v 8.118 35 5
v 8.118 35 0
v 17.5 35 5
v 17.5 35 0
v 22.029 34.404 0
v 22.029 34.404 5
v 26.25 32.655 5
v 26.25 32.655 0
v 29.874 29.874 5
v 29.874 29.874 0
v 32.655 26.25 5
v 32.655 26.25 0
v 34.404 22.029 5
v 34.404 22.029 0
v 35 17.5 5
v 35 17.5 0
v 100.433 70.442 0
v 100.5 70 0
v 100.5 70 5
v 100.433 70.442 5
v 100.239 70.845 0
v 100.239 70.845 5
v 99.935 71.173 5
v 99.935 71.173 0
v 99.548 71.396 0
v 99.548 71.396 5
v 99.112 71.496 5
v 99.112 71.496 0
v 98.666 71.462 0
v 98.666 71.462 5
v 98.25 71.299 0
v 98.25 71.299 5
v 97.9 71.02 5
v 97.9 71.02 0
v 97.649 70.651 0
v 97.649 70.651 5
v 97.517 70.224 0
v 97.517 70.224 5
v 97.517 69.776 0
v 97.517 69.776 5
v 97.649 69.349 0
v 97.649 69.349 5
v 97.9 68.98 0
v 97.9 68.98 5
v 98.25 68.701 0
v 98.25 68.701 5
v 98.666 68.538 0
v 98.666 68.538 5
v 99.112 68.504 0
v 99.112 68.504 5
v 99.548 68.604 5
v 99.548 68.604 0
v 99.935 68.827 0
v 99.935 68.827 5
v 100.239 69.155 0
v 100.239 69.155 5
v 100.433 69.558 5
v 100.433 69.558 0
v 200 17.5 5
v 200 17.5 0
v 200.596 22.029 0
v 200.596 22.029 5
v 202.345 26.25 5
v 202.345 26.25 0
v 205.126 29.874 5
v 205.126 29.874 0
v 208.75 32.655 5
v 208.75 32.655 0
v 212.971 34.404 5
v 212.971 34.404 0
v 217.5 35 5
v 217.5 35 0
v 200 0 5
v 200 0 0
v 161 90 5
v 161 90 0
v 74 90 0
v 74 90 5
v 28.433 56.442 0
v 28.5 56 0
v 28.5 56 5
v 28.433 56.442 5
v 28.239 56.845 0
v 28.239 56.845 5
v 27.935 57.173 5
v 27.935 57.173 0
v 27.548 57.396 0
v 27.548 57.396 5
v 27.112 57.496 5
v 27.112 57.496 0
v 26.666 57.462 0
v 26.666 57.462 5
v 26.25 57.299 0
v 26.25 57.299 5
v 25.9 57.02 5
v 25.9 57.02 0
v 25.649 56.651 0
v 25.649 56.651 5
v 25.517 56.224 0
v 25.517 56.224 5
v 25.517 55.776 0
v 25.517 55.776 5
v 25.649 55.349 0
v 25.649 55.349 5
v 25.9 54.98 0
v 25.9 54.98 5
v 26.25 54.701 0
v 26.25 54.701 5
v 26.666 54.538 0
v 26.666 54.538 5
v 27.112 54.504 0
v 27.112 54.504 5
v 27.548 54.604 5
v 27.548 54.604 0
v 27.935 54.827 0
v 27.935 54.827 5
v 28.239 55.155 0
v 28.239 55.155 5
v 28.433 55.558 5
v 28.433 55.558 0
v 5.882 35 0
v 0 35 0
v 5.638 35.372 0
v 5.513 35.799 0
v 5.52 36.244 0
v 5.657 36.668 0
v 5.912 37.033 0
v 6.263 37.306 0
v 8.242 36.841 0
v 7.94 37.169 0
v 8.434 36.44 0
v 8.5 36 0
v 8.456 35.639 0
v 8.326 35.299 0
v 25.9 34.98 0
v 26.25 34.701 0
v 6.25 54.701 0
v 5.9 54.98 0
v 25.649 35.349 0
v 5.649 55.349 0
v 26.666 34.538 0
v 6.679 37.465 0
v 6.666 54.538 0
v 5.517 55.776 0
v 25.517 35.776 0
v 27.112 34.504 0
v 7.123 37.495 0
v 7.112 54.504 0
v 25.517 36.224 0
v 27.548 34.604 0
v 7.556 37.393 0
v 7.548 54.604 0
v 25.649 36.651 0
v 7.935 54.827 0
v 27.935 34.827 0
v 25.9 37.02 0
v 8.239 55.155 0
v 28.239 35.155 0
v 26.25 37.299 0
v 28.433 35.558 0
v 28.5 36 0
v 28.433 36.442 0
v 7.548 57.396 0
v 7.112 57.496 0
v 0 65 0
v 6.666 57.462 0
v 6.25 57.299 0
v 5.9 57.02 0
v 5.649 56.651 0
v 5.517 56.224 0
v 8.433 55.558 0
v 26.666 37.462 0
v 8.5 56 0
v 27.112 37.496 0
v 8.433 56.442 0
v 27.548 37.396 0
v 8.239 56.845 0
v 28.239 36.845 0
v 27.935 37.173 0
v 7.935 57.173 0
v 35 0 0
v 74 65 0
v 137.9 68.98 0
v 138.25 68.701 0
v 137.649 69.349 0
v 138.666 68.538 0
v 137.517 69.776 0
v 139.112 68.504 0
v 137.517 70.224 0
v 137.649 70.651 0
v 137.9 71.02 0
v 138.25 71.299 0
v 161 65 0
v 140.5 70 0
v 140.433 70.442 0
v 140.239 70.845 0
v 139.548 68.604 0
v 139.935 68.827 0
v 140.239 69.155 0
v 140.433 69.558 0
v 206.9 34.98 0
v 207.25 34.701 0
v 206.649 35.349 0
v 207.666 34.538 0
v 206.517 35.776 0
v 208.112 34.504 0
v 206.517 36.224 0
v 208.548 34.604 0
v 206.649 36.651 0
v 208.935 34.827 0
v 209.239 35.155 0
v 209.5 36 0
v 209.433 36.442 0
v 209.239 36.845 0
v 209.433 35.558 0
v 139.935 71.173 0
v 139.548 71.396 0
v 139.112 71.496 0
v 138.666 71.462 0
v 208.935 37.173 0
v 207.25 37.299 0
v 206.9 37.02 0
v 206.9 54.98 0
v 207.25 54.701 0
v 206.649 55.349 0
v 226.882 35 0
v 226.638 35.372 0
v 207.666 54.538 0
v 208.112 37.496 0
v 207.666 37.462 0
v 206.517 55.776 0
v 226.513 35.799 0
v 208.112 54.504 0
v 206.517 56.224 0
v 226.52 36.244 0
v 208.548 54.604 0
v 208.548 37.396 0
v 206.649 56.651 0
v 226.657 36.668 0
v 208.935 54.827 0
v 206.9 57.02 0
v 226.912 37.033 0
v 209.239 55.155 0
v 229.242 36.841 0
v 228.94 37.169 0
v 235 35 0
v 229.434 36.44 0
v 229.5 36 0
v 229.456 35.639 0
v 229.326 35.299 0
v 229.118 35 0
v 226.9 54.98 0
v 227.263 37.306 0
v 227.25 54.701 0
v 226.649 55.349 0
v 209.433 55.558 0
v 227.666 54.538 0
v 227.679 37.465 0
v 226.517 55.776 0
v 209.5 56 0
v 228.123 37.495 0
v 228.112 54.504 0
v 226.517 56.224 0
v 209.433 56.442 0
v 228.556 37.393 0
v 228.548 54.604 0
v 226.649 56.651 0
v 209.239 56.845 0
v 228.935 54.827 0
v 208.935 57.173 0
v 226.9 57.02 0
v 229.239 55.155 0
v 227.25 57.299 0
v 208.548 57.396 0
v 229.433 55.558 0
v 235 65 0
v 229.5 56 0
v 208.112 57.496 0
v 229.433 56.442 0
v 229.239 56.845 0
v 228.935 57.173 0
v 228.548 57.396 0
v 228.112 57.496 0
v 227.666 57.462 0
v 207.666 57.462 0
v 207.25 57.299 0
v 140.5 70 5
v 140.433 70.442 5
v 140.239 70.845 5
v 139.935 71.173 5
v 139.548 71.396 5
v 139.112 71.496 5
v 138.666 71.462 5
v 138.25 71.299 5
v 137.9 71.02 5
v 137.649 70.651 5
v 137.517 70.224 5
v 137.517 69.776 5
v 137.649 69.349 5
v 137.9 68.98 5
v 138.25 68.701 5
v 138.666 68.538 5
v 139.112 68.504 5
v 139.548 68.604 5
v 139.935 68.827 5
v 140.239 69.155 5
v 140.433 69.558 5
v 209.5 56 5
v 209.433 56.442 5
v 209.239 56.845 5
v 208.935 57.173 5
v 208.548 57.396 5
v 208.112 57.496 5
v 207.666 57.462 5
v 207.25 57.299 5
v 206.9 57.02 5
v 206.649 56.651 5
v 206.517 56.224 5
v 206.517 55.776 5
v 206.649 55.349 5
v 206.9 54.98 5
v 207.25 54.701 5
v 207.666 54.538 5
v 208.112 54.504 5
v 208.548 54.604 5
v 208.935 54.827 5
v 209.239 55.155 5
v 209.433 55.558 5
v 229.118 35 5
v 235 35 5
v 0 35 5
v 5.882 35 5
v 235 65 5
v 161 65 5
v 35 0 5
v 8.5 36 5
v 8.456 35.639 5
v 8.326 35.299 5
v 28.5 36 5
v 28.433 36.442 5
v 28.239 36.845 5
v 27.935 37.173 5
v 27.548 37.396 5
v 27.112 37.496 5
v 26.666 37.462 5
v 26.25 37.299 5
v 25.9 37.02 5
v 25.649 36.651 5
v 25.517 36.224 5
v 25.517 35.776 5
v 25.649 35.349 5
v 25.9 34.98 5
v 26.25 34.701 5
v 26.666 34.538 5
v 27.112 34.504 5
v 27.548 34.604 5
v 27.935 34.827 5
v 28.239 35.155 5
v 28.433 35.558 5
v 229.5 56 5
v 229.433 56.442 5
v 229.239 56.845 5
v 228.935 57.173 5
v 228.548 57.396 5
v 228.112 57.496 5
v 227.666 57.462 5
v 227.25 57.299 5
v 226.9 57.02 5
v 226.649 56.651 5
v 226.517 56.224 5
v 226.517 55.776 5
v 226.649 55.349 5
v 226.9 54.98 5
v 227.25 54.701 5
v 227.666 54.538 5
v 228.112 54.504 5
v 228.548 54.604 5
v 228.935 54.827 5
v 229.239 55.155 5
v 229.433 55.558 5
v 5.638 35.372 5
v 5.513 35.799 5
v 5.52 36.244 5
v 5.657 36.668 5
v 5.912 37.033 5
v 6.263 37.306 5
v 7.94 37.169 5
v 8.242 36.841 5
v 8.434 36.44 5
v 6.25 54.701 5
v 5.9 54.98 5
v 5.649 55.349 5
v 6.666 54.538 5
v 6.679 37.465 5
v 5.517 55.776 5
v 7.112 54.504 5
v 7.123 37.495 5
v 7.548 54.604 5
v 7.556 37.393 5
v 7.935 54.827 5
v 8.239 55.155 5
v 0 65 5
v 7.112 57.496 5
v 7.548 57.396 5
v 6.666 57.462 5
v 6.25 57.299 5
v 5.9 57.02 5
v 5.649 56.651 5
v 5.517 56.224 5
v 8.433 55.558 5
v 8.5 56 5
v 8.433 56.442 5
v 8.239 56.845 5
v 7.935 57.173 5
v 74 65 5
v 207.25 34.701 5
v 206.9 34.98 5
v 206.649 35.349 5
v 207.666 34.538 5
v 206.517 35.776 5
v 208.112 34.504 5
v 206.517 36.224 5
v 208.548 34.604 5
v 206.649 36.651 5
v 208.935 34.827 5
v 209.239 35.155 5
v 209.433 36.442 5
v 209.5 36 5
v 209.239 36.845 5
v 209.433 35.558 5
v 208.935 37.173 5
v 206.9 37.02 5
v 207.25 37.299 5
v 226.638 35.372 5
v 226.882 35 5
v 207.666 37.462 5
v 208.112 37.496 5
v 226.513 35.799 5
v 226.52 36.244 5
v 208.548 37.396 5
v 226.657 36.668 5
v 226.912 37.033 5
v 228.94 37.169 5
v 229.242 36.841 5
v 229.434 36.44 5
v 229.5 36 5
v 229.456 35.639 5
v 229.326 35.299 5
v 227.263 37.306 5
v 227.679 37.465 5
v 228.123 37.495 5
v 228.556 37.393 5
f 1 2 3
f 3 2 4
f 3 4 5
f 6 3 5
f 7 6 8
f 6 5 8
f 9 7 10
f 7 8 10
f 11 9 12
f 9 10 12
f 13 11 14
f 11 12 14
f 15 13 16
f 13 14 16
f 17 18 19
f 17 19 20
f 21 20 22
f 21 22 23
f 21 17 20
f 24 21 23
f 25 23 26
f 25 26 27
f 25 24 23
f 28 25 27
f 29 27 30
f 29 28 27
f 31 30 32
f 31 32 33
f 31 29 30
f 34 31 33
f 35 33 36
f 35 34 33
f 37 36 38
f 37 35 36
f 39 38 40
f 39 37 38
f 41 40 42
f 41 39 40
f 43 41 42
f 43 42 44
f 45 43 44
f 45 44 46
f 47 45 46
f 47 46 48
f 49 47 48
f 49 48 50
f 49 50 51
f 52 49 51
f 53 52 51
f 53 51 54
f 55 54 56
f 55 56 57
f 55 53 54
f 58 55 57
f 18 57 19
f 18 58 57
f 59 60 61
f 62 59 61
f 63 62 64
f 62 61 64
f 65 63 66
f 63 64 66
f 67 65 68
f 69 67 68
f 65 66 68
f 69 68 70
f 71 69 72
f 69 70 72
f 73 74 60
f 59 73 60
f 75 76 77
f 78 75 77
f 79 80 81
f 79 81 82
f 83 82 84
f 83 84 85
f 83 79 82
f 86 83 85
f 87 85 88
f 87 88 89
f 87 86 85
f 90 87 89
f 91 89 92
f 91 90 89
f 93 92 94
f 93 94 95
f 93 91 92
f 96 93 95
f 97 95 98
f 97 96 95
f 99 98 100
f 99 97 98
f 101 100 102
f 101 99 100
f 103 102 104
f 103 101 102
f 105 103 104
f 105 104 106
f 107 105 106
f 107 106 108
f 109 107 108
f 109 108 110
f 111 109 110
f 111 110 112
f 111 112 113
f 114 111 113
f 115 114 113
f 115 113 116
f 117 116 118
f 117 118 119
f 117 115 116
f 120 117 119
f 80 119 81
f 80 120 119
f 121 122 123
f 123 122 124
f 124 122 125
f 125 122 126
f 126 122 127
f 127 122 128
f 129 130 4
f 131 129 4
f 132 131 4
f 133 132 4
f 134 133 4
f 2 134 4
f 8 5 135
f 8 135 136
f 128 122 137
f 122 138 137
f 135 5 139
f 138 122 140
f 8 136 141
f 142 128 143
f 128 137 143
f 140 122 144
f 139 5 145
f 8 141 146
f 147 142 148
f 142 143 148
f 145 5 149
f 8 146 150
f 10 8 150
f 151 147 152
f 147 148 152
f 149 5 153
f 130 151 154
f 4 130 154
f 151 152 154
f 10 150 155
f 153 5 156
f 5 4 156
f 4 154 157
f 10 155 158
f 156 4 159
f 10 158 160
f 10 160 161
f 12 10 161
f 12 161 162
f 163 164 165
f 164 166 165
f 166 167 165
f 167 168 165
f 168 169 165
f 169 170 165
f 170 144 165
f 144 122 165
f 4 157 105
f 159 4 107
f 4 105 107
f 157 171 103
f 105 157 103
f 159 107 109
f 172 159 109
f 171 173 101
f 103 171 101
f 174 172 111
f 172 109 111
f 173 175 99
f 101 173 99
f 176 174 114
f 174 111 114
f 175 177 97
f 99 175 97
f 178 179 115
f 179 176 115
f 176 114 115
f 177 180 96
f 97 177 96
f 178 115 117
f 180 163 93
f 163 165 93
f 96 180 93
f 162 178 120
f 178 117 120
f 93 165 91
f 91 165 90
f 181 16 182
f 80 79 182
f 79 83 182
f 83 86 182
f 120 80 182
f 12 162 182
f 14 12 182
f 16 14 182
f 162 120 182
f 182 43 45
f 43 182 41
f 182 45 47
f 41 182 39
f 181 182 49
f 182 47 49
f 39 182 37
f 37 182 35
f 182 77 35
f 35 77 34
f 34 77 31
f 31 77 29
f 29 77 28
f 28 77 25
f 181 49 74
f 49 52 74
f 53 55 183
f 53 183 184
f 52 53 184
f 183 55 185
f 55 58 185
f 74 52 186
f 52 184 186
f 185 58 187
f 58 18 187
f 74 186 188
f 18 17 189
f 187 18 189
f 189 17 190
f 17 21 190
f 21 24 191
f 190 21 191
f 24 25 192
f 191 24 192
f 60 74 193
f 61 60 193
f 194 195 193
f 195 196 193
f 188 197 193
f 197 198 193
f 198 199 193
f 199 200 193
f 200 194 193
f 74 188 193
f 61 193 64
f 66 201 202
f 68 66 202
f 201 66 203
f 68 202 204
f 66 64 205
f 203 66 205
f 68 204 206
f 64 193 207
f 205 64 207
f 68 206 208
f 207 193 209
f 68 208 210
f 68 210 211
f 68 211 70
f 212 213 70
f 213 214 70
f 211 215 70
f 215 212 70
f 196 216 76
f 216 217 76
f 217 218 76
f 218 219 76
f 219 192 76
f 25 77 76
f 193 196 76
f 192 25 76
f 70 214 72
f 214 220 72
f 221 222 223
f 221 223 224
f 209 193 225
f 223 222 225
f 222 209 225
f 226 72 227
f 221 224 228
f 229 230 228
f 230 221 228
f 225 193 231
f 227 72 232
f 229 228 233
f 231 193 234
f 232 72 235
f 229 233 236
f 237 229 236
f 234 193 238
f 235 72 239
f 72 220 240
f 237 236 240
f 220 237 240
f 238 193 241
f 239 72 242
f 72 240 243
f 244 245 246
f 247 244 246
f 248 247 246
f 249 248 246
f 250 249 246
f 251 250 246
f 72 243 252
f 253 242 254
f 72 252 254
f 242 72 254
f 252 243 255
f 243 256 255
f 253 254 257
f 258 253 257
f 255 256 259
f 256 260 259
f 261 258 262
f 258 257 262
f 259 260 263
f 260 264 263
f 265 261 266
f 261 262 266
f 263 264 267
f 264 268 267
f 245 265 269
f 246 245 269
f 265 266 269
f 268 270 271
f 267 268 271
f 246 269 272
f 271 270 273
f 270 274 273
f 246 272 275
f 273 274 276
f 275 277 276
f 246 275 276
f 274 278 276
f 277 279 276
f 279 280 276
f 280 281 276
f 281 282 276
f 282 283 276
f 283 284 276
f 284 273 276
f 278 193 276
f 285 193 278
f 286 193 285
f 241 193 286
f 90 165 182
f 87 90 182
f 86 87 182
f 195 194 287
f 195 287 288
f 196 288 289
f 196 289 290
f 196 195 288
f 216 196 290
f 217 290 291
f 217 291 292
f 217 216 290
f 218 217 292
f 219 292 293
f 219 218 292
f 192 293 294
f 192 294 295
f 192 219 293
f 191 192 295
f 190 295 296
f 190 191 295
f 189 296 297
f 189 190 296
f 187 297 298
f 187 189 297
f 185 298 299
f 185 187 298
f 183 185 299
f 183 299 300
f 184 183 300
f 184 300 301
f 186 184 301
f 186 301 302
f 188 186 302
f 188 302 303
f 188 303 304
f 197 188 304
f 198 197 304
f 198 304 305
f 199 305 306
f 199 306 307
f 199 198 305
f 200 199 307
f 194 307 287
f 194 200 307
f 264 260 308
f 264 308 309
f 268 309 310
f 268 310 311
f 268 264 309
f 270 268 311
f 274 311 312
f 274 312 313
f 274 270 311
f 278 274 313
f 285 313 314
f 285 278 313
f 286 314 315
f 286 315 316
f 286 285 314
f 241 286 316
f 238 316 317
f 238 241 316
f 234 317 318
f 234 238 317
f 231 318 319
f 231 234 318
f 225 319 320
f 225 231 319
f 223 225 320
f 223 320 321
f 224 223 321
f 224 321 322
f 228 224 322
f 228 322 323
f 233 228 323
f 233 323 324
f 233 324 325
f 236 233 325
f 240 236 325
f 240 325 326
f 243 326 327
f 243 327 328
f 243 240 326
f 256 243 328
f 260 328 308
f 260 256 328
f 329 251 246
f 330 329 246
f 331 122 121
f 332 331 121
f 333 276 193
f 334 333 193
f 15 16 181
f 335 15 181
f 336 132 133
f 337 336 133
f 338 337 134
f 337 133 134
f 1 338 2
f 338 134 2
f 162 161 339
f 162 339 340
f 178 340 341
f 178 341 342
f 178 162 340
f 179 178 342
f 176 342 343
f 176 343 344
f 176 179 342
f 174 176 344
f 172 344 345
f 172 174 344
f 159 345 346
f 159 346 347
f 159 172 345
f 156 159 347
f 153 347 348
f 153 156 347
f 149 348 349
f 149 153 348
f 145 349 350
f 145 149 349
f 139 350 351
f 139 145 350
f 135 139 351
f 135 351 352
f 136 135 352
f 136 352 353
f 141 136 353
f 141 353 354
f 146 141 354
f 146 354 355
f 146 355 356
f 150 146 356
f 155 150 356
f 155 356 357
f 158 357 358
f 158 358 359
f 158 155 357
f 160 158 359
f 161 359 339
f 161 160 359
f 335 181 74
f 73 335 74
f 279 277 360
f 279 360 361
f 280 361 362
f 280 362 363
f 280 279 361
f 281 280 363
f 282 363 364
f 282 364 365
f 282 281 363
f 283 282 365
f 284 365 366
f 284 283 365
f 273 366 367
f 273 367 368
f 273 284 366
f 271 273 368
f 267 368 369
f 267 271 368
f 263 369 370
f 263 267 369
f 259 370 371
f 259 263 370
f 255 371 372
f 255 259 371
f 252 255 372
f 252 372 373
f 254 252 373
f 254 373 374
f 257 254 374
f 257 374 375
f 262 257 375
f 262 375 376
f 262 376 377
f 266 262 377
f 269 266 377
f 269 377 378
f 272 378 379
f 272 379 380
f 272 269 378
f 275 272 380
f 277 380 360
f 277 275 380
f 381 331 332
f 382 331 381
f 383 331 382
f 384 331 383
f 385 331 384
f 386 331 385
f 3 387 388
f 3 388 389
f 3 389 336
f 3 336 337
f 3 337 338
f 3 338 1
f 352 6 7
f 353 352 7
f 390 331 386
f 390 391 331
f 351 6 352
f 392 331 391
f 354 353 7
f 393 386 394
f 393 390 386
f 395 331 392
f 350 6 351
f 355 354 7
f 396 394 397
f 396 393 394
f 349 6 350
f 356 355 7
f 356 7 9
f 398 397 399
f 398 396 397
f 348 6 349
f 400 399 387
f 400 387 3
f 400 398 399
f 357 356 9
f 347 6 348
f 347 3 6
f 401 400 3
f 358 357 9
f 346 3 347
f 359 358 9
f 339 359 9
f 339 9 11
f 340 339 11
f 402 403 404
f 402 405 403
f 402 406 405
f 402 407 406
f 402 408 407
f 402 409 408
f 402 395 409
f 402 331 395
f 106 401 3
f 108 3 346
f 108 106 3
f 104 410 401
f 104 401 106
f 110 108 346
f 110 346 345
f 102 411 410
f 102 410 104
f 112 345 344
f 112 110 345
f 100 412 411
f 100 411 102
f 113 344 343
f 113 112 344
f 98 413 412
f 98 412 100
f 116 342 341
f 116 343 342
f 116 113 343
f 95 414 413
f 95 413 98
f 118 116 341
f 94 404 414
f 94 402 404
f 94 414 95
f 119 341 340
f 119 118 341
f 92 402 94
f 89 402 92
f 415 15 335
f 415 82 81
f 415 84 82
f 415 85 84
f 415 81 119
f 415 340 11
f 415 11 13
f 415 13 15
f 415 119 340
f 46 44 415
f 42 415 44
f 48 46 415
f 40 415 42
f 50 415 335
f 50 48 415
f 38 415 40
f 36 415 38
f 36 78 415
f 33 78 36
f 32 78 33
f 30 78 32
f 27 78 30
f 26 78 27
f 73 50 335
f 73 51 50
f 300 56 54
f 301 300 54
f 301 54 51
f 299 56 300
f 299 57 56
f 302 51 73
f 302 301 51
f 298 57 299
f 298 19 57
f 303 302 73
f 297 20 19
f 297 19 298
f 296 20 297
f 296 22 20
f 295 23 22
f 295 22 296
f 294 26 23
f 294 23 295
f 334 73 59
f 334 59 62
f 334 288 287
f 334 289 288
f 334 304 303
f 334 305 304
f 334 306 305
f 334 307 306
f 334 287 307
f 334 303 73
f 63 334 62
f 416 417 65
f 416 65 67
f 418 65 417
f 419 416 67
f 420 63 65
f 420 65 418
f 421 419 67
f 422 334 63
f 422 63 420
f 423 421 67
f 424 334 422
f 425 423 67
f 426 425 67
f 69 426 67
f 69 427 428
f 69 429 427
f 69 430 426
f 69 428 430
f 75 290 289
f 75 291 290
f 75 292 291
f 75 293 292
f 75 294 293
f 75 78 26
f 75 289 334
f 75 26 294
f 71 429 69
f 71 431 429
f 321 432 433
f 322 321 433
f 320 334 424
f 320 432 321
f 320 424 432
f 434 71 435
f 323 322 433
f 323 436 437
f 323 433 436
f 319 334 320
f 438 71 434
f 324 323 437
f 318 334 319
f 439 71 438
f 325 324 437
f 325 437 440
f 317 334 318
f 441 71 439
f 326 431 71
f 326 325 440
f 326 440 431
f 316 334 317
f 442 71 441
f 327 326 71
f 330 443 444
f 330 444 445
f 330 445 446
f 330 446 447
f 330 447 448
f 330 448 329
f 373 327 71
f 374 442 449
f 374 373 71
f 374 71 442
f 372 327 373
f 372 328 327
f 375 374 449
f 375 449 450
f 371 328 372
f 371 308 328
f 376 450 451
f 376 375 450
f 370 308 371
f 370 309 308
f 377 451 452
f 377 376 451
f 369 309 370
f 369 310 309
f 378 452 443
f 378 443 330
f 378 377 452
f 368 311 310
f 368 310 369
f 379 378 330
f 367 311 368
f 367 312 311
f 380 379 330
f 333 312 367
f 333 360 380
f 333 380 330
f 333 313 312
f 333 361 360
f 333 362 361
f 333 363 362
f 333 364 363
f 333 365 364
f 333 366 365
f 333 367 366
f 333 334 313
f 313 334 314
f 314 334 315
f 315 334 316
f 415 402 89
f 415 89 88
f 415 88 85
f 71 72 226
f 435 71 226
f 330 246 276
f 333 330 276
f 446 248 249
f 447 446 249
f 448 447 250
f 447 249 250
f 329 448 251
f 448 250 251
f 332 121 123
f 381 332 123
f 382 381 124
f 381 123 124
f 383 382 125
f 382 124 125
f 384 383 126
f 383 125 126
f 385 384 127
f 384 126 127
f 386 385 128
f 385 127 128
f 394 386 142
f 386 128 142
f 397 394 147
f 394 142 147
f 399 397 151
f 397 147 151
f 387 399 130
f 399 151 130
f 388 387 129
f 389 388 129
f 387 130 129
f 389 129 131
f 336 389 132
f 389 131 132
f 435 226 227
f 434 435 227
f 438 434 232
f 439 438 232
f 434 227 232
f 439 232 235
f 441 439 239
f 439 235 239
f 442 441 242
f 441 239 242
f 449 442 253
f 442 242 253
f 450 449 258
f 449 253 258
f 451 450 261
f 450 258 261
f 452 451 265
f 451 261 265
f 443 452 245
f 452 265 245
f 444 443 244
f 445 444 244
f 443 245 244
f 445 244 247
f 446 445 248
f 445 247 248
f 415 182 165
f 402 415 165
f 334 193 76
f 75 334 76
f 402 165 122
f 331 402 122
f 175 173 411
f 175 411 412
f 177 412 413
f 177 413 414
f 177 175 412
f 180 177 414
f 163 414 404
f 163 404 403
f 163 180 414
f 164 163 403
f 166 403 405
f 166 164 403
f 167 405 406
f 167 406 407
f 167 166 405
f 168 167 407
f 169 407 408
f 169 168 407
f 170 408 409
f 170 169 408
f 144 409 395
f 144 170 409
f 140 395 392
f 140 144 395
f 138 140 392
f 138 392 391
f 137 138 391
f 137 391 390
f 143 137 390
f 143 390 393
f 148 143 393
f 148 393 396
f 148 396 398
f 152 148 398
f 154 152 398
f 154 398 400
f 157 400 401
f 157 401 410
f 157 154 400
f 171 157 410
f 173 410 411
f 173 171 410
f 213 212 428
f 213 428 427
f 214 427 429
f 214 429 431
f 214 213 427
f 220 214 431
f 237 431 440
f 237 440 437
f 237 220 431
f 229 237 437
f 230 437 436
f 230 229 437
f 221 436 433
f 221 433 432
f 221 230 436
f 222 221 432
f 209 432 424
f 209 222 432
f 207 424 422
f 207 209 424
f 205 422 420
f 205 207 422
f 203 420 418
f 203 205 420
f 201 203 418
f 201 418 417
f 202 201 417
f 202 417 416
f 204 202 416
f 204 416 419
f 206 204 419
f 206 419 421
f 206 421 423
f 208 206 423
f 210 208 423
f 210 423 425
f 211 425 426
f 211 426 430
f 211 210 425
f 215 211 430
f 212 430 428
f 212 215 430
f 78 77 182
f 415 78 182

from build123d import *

# Parameters (mm, degrees)
ESQUISSE1_R        = 1.5
BOSS_EXTRU_1_DEPTH = 5


with BuildPart() as part:
    # Esquisse1 → Boss.-Extru.1 (new body)
    with BuildSketch(Plane.XY):
        with BuildLine():
            Line((35, 17.5), (35, 0))
            Line((35, 0), (200, 0))
            Line((200, 0), (200, 17.5))
            ThreePointArc((200, 17.5), (205.125631329, 29.874368671), (217.5, 35))
            Line((217.5, 35), (226.881966011, 35))
            ThreePointArc((226.881966011, 35), (227.464766865, 37.401258538), (229.5, 36))
            ThreePointArc((229.5, 36), (229.401258538, 35.464766865), (229.118033989, 35))
            Line((229.118033989, 35), (235, 35))
            Line((235, 35), (235, 65))
            Line((235, 65), (161, 65))
            Line((161, 65), (161, 90))
            Line((161, 90), (74, 90))
            Line((74, 90), (74, 65))
            Line((74, 65), (0, 65))
            Line((0, 65), (0, 35))
            Line((0, 35), (5.881966011, 35))
            ThreePointArc((5.881966011, 35), (6.464766865, 37.401258538), (8.5, 36))
            ThreePointArc((8.5, 36), (8.401258538, 35.464766865), (8.118033989, 35))
            Line((8.118033989, 35), (17.5, 35))
            ThreePointArc((17.5, 35), (29.874368671, 29.874368671), (35, 17.5))
        make_face()
        with Locations((27, 36)):
            Circle(ESQUISSE1_R, mode=Mode.SUBTRACT)
        with Locations((208, 36)):
            Circle(ESQUISSE1_R, mode=Mode.SUBTRACT)
        with Locations((7, 56)):
            Circle(ESQUISSE1_R, mode=Mode.SUBTRACT)
        with Locations((27, 56)):
            Circle(ESQUISSE1_R, mode=Mode.SUBTRACT)
        with Locations((99, 70)):
            Circle(ESQUISSE1_R, mode=Mode.SUBTRACT)
        with Locations((208, 56)):
            Circle(ESQUISSE1_R, mode=Mode.SUBTRACT)
        with Locations((228, 56)):
            Circle(ESQUISSE1_R, mode=Mode.SUBTRACT)
        with Locations((139, 70)):
            Circle(ESQUISSE1_R, mode=Mode.SUBTRACT)
    extrude(amount=BOSS_EXTRU_1_DEPTH)


solid = part.part
